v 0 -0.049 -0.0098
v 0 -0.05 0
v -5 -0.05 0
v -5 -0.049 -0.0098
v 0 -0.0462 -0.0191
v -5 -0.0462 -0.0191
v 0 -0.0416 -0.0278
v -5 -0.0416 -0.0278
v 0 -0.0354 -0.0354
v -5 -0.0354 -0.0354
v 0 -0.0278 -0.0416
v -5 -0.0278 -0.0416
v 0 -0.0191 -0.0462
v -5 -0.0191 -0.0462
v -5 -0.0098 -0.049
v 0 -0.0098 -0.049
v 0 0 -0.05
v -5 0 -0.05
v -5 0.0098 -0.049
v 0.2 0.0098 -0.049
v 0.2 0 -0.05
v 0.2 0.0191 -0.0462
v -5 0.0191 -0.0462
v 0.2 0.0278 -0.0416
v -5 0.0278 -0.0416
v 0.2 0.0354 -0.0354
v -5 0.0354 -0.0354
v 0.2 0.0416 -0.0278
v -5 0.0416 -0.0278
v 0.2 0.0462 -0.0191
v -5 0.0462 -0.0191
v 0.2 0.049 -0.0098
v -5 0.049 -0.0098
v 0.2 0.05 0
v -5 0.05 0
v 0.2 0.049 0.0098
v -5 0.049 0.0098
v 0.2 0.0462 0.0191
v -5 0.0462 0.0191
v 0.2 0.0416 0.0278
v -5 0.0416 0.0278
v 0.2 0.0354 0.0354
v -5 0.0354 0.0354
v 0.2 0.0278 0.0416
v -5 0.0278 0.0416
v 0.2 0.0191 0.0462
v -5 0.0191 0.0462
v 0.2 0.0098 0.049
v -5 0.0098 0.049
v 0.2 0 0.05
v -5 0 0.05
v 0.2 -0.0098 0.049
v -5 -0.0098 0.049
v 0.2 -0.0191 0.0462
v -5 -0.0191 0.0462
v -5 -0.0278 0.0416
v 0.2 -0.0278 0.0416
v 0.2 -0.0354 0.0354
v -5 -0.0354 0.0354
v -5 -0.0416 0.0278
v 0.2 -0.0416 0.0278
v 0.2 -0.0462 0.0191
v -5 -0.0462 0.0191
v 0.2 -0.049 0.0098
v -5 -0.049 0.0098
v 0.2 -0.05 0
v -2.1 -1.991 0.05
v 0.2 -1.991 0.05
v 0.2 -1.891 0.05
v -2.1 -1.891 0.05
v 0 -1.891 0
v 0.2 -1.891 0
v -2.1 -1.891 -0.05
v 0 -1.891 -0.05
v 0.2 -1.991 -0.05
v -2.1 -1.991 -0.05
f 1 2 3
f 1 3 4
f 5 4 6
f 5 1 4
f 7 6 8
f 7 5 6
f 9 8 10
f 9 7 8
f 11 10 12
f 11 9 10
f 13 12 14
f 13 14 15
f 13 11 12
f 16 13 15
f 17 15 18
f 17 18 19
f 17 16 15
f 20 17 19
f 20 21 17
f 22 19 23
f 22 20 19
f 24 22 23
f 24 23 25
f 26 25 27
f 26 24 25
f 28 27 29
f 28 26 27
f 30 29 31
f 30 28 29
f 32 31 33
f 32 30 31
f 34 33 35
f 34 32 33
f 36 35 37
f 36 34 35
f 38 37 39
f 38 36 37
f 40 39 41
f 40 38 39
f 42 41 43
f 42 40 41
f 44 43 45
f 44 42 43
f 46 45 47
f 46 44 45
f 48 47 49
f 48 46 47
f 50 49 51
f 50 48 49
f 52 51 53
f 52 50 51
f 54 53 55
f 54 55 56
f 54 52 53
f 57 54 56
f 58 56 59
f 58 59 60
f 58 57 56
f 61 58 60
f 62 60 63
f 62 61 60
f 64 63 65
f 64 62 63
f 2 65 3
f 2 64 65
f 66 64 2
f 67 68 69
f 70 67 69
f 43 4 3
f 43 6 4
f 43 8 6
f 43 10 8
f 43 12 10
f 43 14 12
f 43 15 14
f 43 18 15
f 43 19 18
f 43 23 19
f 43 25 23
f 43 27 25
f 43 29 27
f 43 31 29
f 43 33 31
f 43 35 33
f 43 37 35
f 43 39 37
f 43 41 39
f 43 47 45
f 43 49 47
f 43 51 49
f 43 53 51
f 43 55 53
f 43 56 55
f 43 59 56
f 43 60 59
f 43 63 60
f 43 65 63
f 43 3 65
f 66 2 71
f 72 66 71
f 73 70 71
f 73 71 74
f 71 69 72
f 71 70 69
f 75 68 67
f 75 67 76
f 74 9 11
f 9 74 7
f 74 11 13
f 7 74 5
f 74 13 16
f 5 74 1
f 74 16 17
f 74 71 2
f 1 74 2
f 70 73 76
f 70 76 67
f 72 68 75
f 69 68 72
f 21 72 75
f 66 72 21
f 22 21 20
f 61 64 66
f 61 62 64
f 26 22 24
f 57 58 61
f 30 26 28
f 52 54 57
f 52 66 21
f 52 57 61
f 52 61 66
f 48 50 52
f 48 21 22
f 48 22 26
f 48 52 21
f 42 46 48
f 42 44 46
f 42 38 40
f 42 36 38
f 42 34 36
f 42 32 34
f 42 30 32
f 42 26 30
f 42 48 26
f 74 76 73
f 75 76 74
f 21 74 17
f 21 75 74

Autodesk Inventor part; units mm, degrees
ref_plane "YZ Plane" through (0, 0, 0) normal (1, 0, 0) x (0, 1, 0)
ref_plane "XZ Plane" through (0, 0, 0) normal (0, 1, 0) x (-1, 0, 0)
ref_plane "XY Plane" through (0, 0, 0) normal (0, 0, 1) x (1, 0, 0)
sketch "Sketch1" plane through (0, 0, 0) normal (1, 0, 0) x (0, 1, 0)
  circle A0 centre (0, 0) radius 0.05
  line L0 (0, 0) -> (-1.941, 0)
  line L1 (-1.991, 0.05) -> (-1.891, 0.05)
  line L2 (-1.891, 0.05) -> (-1.891, -0.05)
  line L3 (-1.891, -0.05) -> (-1.991, -0.05)
  line L4 (-1.991, -0.05) -> (-1.991, 0.05)
  line L5 (-1.991, 0.05) -> (-1.891, -0.05) construction
  line L6 (-1.891, 0.05) -> (-1.991, -0.05) construction
  line L7 (-1.891, -0.05) -> (0, -0.05)
  point P0 (-0.05, 0)
  point P1 (-1.891, 0)
  dimension "d0" = 0.1
  dimension "d1" = 1.941
  dimension "d2" = 0.1
  dimension "d3" = 0.1
extrude "Extrusion1" add sketch "Sketch1" along normal blind 0.2
sketch "Sketch2" plane through (0, 0, 0) normal (-1, 0, 0) x (0, 0, 1)
  arc A0 (0, -0.05) -> (-0.05, 0) centre (0, 0) ccw projected
  circle A1 centre (0, 0) radius 0.05
  point P0 (-0.05, 0)
  point P1 (0, -0.05)
  dimension "d6" = 0.1
extrude "Extrusion2" add sketch "Sketch2" along normal blind 5
sketch "Sketch3" plane through (0, 0, 0) normal (-1, 0, 0) x (0, 0, 1)
  line L0 (-0.05, -1.991) -> (-0.05, 0) projected
  line L1 (0.05, -1.991) -> (-0.05, -1.991) projected
  line L2 (-0.05, -1.991) -> (0.05, -1.991)
  line L3 (0, -1.891) -> (0.05, -1.891) projected
  line L4 (0.05, -1.991) -> (0.05, -1.891)
  line L5 (0.05, -1.891) -> (-0.05, -1.891)
  line L6 (-0.05, -1.891) -> (-0.05, -1.991)
  point P0 (0, 0)
extrude "Extrusion3" add sketch "Sketch3" along normal blind 2.1
properties part number "Bone22_12_Fix"
